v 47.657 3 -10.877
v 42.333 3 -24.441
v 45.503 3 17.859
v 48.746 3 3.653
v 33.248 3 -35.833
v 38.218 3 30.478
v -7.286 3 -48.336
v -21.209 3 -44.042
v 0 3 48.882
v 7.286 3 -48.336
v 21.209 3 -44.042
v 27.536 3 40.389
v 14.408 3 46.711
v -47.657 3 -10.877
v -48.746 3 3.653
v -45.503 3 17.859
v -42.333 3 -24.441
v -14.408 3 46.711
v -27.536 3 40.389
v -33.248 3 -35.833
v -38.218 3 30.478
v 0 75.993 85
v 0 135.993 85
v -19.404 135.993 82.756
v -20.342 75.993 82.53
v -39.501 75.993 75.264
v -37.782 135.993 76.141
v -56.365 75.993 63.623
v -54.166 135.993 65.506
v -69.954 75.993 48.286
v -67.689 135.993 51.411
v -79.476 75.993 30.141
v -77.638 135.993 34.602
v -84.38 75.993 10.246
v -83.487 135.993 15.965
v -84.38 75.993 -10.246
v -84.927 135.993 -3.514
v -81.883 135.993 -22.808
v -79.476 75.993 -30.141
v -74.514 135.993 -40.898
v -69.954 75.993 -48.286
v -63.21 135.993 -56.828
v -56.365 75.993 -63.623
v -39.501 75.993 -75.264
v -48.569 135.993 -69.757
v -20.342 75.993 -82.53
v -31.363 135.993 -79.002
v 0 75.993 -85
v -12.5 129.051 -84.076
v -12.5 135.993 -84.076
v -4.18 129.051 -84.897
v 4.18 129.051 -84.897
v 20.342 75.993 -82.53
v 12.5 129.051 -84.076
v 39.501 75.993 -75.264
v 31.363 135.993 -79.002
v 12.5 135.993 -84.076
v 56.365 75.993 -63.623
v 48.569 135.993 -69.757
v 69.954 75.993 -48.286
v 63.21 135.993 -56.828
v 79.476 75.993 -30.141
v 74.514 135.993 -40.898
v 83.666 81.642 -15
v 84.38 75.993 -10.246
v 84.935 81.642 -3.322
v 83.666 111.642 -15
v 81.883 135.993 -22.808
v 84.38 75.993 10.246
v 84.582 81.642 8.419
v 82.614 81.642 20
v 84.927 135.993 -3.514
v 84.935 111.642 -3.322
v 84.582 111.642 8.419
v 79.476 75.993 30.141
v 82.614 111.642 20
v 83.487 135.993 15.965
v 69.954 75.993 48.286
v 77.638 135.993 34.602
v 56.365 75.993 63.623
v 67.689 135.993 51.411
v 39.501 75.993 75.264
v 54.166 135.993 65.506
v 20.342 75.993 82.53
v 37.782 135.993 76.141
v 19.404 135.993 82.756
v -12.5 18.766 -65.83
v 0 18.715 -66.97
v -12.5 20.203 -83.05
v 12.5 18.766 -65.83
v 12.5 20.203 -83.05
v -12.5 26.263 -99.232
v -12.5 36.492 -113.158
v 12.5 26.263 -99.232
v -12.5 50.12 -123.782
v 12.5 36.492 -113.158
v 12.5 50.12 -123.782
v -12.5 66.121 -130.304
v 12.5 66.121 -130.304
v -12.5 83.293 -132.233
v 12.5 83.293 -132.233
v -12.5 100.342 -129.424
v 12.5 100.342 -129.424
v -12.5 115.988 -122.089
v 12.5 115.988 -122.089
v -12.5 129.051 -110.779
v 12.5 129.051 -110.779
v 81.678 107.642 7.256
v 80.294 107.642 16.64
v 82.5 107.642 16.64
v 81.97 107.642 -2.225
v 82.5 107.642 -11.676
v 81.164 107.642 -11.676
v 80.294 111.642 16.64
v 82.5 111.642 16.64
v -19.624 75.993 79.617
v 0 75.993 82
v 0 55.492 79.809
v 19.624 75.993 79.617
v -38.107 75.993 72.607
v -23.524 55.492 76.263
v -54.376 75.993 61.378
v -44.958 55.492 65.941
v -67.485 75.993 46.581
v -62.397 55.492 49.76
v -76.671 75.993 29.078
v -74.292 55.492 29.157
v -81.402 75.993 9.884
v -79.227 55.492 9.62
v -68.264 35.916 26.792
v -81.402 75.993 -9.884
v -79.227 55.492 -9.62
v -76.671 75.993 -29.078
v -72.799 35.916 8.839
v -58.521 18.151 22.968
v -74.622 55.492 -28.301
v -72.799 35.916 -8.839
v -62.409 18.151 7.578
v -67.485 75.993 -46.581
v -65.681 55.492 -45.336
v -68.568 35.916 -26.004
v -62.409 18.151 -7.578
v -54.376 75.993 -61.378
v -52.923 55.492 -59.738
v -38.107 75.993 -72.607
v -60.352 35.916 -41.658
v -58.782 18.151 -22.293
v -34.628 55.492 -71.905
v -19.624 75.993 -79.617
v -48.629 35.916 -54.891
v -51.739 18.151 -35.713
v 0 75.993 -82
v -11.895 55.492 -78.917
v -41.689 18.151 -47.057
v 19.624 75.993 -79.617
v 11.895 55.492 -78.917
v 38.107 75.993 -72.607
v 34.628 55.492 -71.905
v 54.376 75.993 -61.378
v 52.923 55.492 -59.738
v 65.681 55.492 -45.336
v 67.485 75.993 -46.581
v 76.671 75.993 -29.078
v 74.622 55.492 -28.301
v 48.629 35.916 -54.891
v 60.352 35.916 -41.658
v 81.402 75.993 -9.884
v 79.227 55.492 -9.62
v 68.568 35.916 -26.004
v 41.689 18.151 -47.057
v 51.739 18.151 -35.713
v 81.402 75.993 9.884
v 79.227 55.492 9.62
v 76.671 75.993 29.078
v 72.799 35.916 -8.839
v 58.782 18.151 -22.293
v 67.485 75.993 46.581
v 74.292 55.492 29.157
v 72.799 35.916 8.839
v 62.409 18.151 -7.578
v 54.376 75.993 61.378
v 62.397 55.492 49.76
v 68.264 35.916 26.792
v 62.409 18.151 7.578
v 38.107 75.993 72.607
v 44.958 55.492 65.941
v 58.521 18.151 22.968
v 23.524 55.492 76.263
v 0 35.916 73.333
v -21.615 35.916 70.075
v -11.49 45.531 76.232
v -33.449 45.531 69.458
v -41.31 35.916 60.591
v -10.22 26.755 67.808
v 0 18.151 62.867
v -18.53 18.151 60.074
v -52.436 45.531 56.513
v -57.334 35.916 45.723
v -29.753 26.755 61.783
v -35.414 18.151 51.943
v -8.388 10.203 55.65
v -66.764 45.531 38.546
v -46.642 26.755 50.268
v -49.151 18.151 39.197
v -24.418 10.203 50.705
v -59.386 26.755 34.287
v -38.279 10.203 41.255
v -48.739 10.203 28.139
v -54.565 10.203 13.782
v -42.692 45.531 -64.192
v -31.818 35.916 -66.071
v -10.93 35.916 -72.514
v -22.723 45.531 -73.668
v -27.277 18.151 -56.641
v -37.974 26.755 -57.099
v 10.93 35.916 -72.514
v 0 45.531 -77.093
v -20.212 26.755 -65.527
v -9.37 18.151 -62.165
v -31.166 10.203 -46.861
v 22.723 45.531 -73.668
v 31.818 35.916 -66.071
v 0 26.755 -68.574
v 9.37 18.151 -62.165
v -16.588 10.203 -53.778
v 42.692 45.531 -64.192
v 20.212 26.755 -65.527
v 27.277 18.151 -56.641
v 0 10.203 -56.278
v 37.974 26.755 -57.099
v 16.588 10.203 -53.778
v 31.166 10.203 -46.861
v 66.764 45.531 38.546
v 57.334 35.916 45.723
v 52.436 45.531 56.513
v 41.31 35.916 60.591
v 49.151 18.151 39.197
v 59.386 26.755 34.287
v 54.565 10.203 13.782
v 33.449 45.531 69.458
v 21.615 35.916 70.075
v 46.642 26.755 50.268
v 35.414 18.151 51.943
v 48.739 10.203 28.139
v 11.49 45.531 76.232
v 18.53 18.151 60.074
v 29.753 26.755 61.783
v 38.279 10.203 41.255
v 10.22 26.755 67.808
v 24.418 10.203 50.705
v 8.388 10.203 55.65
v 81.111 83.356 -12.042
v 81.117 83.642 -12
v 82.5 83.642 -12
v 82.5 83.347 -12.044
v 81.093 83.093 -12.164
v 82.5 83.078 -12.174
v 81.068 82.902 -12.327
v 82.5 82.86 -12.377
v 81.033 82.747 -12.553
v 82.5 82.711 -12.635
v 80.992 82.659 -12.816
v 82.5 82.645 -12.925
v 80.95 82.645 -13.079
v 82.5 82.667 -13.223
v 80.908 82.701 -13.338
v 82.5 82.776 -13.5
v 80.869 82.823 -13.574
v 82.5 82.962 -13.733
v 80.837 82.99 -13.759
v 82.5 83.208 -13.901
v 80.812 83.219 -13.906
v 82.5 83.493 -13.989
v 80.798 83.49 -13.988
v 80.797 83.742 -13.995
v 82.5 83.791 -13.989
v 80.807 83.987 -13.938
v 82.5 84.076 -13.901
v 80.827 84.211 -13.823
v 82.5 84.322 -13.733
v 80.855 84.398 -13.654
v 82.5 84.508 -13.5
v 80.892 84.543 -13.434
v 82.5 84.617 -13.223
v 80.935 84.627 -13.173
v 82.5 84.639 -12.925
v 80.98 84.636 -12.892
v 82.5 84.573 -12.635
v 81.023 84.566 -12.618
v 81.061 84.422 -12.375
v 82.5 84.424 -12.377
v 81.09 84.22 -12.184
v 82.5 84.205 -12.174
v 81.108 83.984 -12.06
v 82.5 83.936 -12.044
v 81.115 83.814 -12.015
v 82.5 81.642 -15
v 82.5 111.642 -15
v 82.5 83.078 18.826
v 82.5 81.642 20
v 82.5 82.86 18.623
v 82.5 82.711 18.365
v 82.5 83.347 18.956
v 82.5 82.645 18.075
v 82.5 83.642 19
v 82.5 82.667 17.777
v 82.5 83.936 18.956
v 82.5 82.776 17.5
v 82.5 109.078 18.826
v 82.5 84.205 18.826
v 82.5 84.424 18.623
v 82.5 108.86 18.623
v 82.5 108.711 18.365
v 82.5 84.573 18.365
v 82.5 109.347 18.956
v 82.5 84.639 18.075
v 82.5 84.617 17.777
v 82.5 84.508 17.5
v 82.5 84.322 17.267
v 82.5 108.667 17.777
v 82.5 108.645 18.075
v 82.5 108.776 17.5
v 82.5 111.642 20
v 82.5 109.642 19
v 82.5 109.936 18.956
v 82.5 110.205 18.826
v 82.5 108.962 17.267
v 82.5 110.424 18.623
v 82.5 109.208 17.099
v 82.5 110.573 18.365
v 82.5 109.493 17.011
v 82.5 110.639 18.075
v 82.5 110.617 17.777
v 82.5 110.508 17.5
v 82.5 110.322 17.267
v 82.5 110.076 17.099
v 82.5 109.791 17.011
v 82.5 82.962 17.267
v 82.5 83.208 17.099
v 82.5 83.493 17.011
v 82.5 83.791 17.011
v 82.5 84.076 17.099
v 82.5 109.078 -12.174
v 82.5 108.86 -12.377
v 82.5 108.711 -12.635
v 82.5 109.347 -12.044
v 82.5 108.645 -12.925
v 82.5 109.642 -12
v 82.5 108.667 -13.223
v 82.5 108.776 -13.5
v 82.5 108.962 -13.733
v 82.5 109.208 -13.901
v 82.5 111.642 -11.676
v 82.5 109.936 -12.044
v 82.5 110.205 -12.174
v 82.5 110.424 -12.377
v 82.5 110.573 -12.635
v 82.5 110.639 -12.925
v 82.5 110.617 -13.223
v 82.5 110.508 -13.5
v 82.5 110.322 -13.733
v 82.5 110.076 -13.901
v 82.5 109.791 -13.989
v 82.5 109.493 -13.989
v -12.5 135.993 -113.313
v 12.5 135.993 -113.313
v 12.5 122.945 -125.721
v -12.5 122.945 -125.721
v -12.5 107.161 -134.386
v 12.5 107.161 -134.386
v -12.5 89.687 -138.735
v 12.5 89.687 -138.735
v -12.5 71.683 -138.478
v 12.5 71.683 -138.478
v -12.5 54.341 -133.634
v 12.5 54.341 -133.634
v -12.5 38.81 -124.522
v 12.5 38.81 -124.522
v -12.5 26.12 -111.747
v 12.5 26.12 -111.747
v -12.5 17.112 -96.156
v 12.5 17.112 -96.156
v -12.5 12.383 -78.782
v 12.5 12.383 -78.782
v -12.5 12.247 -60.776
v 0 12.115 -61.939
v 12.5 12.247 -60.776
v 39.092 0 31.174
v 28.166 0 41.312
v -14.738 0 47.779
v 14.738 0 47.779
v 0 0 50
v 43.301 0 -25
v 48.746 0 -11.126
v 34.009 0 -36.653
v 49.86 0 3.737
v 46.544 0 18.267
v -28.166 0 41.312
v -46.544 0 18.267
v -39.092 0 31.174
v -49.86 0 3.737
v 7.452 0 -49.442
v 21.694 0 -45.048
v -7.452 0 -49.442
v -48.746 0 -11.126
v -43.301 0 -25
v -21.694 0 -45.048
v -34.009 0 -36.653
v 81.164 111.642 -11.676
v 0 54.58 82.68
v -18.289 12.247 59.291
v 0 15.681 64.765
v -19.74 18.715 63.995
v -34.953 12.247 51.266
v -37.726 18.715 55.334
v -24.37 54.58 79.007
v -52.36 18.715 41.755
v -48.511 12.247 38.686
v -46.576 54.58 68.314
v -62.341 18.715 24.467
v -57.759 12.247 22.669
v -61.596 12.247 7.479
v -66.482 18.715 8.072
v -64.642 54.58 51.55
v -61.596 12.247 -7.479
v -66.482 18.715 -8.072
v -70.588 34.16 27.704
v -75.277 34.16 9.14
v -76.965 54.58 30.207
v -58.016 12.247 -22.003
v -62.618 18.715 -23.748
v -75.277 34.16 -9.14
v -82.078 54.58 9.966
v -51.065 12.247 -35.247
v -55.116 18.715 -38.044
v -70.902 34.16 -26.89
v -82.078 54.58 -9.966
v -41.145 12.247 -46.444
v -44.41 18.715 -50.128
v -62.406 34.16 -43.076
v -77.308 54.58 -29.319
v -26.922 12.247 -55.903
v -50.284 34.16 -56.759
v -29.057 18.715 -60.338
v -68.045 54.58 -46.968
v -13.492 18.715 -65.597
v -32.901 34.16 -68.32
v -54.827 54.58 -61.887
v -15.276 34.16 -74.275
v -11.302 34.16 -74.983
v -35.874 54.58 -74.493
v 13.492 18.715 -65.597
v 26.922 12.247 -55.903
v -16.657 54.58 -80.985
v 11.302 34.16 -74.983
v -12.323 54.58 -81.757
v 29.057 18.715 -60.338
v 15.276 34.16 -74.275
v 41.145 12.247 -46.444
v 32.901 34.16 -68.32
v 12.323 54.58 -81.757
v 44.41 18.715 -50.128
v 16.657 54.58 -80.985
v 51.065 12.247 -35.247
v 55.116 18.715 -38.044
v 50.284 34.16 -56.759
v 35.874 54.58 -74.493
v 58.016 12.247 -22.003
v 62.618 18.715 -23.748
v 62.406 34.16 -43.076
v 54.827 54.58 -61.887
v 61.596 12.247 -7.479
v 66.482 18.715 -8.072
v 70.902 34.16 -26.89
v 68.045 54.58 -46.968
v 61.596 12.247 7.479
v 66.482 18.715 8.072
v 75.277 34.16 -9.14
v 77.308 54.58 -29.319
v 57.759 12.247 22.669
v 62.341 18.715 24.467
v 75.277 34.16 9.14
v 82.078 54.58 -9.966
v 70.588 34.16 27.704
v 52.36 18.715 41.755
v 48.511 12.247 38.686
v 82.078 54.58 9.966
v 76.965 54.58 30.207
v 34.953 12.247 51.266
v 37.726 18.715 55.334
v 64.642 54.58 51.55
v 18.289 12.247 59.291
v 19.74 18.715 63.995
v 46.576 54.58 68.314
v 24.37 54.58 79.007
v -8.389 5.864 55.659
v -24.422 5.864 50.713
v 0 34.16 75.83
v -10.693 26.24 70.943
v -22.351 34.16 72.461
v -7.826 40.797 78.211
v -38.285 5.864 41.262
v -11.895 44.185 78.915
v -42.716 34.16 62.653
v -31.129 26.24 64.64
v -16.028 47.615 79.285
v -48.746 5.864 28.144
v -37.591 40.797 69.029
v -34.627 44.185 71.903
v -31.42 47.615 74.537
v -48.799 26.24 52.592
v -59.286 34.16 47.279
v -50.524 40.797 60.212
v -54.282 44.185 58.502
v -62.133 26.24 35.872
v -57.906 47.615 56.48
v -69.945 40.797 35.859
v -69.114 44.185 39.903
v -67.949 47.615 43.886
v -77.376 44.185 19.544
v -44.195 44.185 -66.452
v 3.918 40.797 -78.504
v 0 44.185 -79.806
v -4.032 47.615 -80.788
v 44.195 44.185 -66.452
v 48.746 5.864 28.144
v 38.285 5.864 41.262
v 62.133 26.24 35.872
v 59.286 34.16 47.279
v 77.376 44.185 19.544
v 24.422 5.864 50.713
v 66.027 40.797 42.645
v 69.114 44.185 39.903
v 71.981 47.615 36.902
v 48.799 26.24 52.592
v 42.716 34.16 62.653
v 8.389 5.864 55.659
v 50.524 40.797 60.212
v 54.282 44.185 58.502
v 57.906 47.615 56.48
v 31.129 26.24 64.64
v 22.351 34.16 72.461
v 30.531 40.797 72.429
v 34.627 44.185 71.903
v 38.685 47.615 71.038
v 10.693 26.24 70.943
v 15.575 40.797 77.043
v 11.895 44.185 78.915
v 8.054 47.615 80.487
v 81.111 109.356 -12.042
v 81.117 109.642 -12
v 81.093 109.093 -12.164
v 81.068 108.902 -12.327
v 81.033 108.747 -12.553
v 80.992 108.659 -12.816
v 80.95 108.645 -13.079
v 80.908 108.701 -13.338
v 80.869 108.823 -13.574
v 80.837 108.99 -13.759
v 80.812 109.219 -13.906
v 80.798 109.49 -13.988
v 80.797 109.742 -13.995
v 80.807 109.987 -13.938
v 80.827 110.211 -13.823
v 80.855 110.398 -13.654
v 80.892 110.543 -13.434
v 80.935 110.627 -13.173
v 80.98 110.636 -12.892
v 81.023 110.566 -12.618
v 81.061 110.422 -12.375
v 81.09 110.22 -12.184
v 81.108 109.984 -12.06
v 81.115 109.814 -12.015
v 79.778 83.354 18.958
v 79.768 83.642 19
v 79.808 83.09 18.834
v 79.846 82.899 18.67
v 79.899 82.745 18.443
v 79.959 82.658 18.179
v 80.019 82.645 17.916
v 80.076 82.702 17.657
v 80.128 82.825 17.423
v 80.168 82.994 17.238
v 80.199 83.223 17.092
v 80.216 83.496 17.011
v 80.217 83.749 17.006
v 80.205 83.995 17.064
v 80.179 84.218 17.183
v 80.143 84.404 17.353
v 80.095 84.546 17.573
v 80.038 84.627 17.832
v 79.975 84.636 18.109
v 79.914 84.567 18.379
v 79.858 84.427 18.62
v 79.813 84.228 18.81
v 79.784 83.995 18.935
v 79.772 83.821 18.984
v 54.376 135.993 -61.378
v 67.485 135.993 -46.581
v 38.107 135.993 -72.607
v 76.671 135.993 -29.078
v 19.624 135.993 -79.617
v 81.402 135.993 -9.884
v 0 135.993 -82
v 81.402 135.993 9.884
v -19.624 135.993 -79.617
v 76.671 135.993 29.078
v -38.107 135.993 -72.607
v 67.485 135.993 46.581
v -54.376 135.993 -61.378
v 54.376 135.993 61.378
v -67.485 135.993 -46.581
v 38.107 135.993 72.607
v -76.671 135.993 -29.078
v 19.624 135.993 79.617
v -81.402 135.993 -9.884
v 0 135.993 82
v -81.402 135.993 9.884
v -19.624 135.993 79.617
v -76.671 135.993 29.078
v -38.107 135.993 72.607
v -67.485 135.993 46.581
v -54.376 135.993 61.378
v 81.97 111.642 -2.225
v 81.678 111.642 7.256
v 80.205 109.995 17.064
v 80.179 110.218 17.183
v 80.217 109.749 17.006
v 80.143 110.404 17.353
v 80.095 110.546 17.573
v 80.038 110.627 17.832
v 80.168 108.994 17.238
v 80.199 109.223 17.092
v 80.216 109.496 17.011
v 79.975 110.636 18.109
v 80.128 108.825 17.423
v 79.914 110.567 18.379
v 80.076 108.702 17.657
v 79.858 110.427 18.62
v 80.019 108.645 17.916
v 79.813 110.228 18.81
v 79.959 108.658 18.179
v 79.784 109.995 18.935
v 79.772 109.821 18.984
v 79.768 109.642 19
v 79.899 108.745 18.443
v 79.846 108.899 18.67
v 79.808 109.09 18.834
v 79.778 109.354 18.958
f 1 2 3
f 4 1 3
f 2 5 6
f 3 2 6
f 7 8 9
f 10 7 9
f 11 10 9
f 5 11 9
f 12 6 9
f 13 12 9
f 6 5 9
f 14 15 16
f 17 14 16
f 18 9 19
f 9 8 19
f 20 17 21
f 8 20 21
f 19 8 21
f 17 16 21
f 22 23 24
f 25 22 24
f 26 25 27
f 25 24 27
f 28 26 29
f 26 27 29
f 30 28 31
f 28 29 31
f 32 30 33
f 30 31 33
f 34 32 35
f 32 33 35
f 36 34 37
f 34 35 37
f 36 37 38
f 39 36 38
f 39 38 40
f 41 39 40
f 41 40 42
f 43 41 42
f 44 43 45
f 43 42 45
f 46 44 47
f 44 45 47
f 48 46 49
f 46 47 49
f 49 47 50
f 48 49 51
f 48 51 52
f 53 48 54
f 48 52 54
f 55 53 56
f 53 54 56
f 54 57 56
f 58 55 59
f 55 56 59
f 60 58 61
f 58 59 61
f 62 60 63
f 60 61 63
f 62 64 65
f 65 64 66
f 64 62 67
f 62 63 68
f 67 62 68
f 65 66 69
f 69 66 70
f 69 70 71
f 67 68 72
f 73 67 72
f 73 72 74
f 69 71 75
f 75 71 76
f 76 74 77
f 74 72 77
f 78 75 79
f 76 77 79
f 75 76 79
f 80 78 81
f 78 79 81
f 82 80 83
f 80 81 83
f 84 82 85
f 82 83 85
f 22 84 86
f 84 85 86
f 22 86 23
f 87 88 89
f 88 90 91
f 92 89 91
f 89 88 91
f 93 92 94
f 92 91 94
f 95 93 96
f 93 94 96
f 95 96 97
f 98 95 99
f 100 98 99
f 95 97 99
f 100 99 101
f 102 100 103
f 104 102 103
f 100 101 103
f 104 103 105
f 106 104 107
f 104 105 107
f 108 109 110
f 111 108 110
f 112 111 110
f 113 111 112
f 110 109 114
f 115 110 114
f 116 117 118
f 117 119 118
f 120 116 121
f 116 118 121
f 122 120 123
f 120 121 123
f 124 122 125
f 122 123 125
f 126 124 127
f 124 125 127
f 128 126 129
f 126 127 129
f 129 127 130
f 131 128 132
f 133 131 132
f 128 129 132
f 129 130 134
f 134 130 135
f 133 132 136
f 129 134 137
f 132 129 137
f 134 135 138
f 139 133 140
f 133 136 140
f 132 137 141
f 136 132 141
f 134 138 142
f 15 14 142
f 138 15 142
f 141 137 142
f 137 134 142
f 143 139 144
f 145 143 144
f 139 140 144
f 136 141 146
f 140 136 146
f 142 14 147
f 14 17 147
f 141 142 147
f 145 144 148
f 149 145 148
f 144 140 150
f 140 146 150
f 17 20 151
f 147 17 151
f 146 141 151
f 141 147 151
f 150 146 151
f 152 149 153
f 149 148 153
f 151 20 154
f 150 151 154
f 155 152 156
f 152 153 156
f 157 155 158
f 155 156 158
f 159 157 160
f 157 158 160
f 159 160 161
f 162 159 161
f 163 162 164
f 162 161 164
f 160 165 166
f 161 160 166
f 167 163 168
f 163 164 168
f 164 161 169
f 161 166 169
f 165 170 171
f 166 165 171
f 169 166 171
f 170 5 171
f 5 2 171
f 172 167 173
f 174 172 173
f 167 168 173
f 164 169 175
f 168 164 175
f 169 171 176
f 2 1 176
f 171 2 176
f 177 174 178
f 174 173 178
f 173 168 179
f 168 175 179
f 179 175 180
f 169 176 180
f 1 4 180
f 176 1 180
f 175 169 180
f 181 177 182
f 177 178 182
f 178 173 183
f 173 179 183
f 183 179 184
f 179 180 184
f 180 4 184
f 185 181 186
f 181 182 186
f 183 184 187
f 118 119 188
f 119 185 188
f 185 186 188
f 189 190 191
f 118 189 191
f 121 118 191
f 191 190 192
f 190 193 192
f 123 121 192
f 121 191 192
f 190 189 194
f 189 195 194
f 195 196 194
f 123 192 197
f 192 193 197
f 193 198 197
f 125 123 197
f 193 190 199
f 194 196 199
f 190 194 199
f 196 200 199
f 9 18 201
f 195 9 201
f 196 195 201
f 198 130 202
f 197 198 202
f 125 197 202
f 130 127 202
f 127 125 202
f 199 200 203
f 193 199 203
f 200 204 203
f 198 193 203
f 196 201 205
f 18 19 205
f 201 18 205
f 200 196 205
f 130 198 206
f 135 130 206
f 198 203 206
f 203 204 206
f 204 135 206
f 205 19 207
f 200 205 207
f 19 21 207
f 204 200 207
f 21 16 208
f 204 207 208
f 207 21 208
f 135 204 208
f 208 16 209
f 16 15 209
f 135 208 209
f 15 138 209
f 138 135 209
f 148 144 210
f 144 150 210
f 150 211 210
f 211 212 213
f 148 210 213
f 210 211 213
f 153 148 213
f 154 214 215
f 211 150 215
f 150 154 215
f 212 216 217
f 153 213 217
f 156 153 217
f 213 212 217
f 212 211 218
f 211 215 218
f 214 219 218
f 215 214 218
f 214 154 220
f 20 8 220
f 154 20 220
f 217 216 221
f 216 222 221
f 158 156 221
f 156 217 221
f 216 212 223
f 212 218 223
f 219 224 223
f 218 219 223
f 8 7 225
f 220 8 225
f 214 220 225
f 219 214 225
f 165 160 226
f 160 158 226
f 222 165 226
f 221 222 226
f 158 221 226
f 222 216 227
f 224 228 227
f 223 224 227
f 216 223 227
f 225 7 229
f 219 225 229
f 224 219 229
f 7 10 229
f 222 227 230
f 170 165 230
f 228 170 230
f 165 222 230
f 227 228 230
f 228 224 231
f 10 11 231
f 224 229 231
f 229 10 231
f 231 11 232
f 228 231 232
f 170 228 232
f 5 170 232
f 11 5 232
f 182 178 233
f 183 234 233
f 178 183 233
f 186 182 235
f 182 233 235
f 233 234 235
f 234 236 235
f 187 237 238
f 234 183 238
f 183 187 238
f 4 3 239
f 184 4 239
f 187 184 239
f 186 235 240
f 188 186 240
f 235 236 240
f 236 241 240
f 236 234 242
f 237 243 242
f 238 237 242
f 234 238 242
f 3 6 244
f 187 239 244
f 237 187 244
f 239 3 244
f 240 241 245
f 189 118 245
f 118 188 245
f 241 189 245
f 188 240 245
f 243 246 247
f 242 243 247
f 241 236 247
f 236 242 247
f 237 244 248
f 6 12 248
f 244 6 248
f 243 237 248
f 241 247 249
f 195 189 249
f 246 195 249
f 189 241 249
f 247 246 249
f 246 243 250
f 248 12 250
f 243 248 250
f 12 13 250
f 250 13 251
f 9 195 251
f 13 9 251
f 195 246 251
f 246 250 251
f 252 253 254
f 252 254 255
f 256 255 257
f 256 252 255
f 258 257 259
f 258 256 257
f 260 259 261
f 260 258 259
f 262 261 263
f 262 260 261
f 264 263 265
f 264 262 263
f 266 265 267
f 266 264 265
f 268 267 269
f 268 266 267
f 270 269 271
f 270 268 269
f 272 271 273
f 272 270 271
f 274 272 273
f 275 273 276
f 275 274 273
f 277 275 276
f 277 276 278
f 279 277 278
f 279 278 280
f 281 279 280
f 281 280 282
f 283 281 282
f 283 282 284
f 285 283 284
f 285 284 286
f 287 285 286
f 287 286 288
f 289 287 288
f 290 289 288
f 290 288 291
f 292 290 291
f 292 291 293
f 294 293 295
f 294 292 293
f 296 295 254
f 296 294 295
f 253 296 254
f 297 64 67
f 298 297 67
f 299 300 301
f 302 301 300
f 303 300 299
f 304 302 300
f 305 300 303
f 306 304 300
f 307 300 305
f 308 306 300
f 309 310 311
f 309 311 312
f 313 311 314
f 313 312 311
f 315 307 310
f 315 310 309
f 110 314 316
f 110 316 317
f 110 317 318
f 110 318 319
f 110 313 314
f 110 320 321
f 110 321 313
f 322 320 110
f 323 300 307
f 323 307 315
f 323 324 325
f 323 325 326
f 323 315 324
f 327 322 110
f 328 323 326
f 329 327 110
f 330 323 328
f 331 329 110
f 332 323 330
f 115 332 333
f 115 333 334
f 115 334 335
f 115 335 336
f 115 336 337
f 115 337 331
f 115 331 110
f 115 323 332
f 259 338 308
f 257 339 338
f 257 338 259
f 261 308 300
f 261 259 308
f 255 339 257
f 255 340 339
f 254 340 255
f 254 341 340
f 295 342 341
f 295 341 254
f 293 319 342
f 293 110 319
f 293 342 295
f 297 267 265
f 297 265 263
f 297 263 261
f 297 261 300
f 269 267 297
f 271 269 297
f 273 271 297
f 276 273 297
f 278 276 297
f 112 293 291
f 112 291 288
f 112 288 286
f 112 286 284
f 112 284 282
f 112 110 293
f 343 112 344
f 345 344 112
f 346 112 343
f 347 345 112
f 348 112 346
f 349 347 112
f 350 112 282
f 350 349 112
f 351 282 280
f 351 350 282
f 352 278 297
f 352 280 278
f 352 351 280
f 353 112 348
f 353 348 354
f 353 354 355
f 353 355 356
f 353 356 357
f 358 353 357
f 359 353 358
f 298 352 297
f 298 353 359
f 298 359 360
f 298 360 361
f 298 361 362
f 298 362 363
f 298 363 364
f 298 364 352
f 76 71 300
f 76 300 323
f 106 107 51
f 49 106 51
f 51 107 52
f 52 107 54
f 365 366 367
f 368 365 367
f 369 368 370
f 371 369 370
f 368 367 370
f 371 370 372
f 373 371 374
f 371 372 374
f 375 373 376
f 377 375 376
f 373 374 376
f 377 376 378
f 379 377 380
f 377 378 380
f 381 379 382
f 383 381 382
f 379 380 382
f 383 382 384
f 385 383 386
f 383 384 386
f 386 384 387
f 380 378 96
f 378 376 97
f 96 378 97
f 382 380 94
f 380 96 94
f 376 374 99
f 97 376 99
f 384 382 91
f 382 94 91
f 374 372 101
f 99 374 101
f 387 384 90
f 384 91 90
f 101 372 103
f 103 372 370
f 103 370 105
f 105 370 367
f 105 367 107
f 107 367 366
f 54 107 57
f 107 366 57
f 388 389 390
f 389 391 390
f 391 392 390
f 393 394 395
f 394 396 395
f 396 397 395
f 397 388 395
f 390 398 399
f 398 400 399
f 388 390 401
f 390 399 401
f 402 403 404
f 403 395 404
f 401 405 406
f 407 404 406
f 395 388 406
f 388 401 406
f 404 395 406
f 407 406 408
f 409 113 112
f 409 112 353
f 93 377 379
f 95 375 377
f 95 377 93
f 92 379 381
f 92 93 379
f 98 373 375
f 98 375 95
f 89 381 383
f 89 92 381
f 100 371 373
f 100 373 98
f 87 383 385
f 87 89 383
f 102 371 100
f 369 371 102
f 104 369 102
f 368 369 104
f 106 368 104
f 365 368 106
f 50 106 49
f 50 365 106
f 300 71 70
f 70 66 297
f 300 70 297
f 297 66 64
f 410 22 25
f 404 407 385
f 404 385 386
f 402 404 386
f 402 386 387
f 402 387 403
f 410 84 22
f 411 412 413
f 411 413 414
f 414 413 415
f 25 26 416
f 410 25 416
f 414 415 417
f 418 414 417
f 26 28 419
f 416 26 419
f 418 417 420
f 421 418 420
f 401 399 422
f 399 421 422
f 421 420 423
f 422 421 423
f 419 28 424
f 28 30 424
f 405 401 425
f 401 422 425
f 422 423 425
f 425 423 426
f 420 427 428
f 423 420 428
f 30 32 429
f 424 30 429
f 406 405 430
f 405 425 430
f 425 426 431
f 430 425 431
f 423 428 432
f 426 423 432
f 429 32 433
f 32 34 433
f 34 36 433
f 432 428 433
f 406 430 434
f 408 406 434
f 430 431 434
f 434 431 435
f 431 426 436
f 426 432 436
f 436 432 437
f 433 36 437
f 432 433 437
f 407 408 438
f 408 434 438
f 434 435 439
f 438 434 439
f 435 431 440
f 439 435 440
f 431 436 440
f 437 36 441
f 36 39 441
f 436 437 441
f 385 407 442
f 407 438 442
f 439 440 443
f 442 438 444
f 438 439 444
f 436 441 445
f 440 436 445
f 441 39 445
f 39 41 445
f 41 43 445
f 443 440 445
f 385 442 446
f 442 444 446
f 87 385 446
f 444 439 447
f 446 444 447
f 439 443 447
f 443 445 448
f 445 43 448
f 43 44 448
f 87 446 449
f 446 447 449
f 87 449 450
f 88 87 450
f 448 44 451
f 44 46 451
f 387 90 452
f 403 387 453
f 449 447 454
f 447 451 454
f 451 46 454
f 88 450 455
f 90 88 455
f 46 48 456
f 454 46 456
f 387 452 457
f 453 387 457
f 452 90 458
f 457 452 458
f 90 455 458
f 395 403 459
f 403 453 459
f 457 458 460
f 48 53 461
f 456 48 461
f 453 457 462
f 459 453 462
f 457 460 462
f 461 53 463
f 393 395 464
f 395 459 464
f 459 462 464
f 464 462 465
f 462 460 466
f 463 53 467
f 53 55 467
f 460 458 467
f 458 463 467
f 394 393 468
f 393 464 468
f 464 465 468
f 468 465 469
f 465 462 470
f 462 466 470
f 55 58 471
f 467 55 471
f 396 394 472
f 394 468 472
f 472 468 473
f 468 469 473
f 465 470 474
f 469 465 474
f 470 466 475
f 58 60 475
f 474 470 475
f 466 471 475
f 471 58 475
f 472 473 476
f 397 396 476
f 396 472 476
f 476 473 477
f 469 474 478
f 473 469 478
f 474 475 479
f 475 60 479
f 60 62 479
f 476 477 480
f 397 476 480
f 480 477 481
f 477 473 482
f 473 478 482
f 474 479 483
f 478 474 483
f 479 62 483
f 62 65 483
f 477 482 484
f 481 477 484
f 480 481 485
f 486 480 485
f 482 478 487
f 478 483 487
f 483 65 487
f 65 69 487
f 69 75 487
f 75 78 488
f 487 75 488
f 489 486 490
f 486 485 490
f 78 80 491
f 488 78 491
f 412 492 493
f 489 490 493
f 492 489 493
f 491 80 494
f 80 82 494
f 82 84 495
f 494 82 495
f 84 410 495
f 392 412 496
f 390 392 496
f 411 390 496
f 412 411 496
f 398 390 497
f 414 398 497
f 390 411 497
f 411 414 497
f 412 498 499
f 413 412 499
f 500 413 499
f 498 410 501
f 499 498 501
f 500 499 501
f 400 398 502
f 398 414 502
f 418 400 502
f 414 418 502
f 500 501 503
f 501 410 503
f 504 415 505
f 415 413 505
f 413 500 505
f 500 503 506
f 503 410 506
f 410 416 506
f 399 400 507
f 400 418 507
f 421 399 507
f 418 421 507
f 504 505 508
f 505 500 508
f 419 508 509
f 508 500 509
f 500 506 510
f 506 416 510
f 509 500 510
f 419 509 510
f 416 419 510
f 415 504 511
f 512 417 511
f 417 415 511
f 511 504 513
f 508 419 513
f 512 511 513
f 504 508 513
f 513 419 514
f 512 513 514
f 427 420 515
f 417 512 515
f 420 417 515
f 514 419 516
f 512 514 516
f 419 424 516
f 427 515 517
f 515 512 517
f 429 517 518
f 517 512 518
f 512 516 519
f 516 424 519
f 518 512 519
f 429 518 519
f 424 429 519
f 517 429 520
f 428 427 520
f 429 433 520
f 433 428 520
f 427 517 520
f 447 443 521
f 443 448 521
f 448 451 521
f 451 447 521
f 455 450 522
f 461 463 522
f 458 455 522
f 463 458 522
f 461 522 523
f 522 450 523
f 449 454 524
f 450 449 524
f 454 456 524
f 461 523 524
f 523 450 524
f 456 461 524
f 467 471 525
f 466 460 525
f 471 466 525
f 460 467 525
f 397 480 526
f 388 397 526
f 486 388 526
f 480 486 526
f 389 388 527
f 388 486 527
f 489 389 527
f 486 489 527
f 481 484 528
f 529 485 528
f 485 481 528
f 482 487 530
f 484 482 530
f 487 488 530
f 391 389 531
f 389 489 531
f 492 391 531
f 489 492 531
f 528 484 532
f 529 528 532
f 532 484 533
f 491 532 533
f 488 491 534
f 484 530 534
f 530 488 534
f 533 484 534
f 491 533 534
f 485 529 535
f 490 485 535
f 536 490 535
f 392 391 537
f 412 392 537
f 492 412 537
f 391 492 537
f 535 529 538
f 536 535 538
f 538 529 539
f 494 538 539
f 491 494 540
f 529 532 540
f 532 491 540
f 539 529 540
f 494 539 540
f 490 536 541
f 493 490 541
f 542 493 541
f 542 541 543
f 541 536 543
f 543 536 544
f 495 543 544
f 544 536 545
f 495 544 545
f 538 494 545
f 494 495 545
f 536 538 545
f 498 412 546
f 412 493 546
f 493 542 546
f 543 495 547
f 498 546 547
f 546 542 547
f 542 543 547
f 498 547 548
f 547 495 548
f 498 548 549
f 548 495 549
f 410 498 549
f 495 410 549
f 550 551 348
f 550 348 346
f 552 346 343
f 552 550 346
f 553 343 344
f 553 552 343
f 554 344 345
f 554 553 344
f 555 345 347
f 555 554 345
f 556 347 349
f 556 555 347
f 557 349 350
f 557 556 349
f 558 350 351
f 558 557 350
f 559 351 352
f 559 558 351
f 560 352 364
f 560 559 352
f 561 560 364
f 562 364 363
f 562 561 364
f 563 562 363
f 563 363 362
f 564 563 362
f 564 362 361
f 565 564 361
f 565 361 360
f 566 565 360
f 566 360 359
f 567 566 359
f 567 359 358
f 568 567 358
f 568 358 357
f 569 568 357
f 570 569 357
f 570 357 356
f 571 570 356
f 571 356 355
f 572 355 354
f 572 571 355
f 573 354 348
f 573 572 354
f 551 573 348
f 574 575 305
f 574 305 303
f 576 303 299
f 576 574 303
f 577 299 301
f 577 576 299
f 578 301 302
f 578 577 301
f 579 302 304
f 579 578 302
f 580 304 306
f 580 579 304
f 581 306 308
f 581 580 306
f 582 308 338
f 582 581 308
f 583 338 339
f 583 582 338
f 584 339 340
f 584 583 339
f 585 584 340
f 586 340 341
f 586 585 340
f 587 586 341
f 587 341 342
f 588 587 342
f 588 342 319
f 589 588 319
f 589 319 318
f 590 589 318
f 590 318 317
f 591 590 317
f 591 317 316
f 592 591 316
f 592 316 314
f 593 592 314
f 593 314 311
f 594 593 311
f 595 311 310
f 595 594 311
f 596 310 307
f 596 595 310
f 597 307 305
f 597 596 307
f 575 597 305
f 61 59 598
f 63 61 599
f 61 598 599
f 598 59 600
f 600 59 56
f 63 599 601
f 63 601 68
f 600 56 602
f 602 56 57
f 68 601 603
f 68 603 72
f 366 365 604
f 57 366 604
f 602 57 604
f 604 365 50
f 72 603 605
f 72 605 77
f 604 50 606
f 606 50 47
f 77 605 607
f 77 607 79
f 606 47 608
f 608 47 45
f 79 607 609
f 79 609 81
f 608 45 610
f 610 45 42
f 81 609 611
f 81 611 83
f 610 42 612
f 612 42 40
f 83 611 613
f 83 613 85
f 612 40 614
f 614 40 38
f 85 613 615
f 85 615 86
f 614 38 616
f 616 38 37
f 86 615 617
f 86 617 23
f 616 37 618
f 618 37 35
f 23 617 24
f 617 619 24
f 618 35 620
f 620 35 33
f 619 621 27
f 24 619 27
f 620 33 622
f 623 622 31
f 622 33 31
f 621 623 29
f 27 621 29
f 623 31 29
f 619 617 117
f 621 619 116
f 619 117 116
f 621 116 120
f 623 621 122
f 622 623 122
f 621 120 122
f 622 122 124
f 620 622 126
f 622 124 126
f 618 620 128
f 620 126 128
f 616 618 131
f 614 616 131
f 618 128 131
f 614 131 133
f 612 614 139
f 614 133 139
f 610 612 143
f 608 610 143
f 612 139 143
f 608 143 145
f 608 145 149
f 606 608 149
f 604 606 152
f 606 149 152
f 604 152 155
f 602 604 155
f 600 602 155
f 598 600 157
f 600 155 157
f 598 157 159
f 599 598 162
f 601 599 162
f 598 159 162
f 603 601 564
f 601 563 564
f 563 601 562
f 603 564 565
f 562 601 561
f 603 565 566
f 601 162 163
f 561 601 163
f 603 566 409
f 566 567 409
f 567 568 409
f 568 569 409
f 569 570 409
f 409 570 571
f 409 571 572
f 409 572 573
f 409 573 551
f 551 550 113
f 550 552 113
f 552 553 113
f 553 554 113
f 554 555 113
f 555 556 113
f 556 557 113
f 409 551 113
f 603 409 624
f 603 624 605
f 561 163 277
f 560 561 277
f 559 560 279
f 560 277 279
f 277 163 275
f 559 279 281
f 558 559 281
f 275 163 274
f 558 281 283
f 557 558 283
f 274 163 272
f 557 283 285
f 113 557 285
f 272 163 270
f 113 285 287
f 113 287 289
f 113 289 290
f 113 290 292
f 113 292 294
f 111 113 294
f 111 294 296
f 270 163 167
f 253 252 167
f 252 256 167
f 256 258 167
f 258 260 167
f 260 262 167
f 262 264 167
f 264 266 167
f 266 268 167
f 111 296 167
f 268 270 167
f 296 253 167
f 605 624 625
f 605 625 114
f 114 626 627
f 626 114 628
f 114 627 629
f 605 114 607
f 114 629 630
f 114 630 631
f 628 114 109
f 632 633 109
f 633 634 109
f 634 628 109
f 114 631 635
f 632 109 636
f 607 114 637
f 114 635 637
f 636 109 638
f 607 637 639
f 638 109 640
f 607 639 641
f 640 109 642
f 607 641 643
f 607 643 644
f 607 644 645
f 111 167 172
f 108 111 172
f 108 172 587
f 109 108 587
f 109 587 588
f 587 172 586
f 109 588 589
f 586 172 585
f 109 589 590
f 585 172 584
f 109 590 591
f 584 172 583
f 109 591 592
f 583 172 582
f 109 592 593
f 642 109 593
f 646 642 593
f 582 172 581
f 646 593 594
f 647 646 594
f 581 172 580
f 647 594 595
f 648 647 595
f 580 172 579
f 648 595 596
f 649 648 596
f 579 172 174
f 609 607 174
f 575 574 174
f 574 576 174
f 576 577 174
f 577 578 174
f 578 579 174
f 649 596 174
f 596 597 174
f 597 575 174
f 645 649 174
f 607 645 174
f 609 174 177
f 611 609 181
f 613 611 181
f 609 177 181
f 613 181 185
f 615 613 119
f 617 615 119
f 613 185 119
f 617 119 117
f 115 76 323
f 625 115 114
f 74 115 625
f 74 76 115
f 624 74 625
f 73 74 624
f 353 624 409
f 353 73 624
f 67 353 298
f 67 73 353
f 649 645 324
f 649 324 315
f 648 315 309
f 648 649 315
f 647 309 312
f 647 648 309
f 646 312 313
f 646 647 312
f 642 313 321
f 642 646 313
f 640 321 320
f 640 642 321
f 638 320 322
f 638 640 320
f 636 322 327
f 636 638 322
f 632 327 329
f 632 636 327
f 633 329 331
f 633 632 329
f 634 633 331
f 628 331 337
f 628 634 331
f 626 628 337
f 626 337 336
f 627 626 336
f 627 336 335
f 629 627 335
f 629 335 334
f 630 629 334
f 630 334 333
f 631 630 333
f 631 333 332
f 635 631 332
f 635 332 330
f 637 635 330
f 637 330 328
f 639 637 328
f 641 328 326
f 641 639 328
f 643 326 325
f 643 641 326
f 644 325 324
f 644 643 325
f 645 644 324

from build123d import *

# Parameters (mm, degrees)
CUT_EXTRUDE1_START  = 90
SKETCH5_W           = 35
SKETCH5_H           = 30
CUT_EXTRUDE1_DEPTH  = 7.5
SKETCH6_R           = 1
CUT_EXTRUDE2_DEPTH  = 200
SKETCH7_W           = 28.316069795
SKETCH7_H           = 4
CUT_EXTRUDE3_DEPTH  = 200
BOSS_EXTRUDE1_DEPTH = 12.5


with BuildPart() as part:
    # Sketch1 → Revolve1 (revolve)
    with BuildSketch(Plane.XY, mode=Mode.PRIVATE) as revolve1_sk:
        with BuildLine():
            Line((0, 0), (50, 0))
            ThreePointArc((50, 0), (75.829510623, 34.160419441), (85, 75.993420768))
            Line((85, 75.993420768), (85, 135.993420768))
            Line((85, 135.993420768), (82, 135.993420768))
            Line((82, 135.993420768), (82, 75.993420768))
            ThreePointArc((82, 75.993420768), (73.333437657, 35.915948395), (48.882396046, 3))
            Line((48.882396046, 3), (0, 3))
            Line((0, 3), (0, 0))
        make_face()
    revolve(revolve1_sk.sketch.rotate(Axis((0, 3, 0), (0, -1, 0)), 90), axis=Axis((0, 3, 0), (0, -1, 0)))

    # Sketch5 → Cut-Extrude1 (cut)
    with BuildSketch(Plane(origin=(0, 0, 0), x_dir=(0, 0, -1), z_dir=(1, 0, 0)).offset(CUT_EXTRUDE1_START)):
        with Locations((-2.5, 96.64173894)):
            Rectangle(SKETCH5_W, SKETCH5_H)
    extrude(amount=-CUT_EXTRUDE1_DEPTH, mode=Mode.SUBTRACT)

    # Sketch6 → Cut-Extrude2 (cut)
    with BuildSketch(Plane(origin=(0, 0, 0), x_dir=(0, 0, -1), z_dir=(1, 0, 0))):
        with Locations(Location((13, 109.64173894, 0), (0, 0, 180))):
            Circle(SKETCH6_R)
        with Locations(Location((-18, 109.64173894, 0), (0, 0, 180))):
            Circle(SKETCH6_R)
        with Locations(Location((-18, 83.64173894, 0), (0, 0, 180))):
            Circle(SKETCH6_R)
        with Locations(Location((13, 83.64173894, 0), (0, 0, 180))):
            Circle(SKETCH6_R)
    extrude(amount=CUT_EXTRUDE2_DEPTH, mode=Mode.SUBTRACT)

    # Sketch7 → Cut-Extrude3 (cut)
    with BuildSketch(Plane(origin=(0, 0, 0), x_dir=(0, 0, -1), z_dir=(1, 0, 0))):
        with Locations((-2.481965103, 109.64173894)):
            Rectangle(SKETCH7_W, SKETCH7_H)
    extrude(amount=CUT_EXTRUDE3_DEPTH, mode=Mode.SUBTRACT)

    # Sketch8 → Boss-Extrude1 (add, symmetric)
    with BuildSketch(Plane(origin=(0, 0, 0), x_dir=(0, 0, -1), z_dir=(1, 0, 0))):
        with BuildLine():
            Line((83.312879319, 135.993420768), (113.312879319, 135.993420768))
            ThreePointArc((113.312879319, 135.993420768), (133.385711701, 53.763756217), (59.530866873, 12.410422282))
            Line((59.530866873, 12.410422282), (64.835382952, 18.828532511))
            ThreePointArc((64.835382952, 18.828532511), (127.404142813, 57.435015297), (110.778554033, 129.051354364))
            Line((110.778554033, 129.051354364), (83.312879319, 129.051354364))
            Line((83.312879319, 129.051354364), (83.312879319, 135.993420768))
        make_face()
    extrude(amount=BOSS_EXTRUDE1_DEPTH, both=True)


solid = part.part
